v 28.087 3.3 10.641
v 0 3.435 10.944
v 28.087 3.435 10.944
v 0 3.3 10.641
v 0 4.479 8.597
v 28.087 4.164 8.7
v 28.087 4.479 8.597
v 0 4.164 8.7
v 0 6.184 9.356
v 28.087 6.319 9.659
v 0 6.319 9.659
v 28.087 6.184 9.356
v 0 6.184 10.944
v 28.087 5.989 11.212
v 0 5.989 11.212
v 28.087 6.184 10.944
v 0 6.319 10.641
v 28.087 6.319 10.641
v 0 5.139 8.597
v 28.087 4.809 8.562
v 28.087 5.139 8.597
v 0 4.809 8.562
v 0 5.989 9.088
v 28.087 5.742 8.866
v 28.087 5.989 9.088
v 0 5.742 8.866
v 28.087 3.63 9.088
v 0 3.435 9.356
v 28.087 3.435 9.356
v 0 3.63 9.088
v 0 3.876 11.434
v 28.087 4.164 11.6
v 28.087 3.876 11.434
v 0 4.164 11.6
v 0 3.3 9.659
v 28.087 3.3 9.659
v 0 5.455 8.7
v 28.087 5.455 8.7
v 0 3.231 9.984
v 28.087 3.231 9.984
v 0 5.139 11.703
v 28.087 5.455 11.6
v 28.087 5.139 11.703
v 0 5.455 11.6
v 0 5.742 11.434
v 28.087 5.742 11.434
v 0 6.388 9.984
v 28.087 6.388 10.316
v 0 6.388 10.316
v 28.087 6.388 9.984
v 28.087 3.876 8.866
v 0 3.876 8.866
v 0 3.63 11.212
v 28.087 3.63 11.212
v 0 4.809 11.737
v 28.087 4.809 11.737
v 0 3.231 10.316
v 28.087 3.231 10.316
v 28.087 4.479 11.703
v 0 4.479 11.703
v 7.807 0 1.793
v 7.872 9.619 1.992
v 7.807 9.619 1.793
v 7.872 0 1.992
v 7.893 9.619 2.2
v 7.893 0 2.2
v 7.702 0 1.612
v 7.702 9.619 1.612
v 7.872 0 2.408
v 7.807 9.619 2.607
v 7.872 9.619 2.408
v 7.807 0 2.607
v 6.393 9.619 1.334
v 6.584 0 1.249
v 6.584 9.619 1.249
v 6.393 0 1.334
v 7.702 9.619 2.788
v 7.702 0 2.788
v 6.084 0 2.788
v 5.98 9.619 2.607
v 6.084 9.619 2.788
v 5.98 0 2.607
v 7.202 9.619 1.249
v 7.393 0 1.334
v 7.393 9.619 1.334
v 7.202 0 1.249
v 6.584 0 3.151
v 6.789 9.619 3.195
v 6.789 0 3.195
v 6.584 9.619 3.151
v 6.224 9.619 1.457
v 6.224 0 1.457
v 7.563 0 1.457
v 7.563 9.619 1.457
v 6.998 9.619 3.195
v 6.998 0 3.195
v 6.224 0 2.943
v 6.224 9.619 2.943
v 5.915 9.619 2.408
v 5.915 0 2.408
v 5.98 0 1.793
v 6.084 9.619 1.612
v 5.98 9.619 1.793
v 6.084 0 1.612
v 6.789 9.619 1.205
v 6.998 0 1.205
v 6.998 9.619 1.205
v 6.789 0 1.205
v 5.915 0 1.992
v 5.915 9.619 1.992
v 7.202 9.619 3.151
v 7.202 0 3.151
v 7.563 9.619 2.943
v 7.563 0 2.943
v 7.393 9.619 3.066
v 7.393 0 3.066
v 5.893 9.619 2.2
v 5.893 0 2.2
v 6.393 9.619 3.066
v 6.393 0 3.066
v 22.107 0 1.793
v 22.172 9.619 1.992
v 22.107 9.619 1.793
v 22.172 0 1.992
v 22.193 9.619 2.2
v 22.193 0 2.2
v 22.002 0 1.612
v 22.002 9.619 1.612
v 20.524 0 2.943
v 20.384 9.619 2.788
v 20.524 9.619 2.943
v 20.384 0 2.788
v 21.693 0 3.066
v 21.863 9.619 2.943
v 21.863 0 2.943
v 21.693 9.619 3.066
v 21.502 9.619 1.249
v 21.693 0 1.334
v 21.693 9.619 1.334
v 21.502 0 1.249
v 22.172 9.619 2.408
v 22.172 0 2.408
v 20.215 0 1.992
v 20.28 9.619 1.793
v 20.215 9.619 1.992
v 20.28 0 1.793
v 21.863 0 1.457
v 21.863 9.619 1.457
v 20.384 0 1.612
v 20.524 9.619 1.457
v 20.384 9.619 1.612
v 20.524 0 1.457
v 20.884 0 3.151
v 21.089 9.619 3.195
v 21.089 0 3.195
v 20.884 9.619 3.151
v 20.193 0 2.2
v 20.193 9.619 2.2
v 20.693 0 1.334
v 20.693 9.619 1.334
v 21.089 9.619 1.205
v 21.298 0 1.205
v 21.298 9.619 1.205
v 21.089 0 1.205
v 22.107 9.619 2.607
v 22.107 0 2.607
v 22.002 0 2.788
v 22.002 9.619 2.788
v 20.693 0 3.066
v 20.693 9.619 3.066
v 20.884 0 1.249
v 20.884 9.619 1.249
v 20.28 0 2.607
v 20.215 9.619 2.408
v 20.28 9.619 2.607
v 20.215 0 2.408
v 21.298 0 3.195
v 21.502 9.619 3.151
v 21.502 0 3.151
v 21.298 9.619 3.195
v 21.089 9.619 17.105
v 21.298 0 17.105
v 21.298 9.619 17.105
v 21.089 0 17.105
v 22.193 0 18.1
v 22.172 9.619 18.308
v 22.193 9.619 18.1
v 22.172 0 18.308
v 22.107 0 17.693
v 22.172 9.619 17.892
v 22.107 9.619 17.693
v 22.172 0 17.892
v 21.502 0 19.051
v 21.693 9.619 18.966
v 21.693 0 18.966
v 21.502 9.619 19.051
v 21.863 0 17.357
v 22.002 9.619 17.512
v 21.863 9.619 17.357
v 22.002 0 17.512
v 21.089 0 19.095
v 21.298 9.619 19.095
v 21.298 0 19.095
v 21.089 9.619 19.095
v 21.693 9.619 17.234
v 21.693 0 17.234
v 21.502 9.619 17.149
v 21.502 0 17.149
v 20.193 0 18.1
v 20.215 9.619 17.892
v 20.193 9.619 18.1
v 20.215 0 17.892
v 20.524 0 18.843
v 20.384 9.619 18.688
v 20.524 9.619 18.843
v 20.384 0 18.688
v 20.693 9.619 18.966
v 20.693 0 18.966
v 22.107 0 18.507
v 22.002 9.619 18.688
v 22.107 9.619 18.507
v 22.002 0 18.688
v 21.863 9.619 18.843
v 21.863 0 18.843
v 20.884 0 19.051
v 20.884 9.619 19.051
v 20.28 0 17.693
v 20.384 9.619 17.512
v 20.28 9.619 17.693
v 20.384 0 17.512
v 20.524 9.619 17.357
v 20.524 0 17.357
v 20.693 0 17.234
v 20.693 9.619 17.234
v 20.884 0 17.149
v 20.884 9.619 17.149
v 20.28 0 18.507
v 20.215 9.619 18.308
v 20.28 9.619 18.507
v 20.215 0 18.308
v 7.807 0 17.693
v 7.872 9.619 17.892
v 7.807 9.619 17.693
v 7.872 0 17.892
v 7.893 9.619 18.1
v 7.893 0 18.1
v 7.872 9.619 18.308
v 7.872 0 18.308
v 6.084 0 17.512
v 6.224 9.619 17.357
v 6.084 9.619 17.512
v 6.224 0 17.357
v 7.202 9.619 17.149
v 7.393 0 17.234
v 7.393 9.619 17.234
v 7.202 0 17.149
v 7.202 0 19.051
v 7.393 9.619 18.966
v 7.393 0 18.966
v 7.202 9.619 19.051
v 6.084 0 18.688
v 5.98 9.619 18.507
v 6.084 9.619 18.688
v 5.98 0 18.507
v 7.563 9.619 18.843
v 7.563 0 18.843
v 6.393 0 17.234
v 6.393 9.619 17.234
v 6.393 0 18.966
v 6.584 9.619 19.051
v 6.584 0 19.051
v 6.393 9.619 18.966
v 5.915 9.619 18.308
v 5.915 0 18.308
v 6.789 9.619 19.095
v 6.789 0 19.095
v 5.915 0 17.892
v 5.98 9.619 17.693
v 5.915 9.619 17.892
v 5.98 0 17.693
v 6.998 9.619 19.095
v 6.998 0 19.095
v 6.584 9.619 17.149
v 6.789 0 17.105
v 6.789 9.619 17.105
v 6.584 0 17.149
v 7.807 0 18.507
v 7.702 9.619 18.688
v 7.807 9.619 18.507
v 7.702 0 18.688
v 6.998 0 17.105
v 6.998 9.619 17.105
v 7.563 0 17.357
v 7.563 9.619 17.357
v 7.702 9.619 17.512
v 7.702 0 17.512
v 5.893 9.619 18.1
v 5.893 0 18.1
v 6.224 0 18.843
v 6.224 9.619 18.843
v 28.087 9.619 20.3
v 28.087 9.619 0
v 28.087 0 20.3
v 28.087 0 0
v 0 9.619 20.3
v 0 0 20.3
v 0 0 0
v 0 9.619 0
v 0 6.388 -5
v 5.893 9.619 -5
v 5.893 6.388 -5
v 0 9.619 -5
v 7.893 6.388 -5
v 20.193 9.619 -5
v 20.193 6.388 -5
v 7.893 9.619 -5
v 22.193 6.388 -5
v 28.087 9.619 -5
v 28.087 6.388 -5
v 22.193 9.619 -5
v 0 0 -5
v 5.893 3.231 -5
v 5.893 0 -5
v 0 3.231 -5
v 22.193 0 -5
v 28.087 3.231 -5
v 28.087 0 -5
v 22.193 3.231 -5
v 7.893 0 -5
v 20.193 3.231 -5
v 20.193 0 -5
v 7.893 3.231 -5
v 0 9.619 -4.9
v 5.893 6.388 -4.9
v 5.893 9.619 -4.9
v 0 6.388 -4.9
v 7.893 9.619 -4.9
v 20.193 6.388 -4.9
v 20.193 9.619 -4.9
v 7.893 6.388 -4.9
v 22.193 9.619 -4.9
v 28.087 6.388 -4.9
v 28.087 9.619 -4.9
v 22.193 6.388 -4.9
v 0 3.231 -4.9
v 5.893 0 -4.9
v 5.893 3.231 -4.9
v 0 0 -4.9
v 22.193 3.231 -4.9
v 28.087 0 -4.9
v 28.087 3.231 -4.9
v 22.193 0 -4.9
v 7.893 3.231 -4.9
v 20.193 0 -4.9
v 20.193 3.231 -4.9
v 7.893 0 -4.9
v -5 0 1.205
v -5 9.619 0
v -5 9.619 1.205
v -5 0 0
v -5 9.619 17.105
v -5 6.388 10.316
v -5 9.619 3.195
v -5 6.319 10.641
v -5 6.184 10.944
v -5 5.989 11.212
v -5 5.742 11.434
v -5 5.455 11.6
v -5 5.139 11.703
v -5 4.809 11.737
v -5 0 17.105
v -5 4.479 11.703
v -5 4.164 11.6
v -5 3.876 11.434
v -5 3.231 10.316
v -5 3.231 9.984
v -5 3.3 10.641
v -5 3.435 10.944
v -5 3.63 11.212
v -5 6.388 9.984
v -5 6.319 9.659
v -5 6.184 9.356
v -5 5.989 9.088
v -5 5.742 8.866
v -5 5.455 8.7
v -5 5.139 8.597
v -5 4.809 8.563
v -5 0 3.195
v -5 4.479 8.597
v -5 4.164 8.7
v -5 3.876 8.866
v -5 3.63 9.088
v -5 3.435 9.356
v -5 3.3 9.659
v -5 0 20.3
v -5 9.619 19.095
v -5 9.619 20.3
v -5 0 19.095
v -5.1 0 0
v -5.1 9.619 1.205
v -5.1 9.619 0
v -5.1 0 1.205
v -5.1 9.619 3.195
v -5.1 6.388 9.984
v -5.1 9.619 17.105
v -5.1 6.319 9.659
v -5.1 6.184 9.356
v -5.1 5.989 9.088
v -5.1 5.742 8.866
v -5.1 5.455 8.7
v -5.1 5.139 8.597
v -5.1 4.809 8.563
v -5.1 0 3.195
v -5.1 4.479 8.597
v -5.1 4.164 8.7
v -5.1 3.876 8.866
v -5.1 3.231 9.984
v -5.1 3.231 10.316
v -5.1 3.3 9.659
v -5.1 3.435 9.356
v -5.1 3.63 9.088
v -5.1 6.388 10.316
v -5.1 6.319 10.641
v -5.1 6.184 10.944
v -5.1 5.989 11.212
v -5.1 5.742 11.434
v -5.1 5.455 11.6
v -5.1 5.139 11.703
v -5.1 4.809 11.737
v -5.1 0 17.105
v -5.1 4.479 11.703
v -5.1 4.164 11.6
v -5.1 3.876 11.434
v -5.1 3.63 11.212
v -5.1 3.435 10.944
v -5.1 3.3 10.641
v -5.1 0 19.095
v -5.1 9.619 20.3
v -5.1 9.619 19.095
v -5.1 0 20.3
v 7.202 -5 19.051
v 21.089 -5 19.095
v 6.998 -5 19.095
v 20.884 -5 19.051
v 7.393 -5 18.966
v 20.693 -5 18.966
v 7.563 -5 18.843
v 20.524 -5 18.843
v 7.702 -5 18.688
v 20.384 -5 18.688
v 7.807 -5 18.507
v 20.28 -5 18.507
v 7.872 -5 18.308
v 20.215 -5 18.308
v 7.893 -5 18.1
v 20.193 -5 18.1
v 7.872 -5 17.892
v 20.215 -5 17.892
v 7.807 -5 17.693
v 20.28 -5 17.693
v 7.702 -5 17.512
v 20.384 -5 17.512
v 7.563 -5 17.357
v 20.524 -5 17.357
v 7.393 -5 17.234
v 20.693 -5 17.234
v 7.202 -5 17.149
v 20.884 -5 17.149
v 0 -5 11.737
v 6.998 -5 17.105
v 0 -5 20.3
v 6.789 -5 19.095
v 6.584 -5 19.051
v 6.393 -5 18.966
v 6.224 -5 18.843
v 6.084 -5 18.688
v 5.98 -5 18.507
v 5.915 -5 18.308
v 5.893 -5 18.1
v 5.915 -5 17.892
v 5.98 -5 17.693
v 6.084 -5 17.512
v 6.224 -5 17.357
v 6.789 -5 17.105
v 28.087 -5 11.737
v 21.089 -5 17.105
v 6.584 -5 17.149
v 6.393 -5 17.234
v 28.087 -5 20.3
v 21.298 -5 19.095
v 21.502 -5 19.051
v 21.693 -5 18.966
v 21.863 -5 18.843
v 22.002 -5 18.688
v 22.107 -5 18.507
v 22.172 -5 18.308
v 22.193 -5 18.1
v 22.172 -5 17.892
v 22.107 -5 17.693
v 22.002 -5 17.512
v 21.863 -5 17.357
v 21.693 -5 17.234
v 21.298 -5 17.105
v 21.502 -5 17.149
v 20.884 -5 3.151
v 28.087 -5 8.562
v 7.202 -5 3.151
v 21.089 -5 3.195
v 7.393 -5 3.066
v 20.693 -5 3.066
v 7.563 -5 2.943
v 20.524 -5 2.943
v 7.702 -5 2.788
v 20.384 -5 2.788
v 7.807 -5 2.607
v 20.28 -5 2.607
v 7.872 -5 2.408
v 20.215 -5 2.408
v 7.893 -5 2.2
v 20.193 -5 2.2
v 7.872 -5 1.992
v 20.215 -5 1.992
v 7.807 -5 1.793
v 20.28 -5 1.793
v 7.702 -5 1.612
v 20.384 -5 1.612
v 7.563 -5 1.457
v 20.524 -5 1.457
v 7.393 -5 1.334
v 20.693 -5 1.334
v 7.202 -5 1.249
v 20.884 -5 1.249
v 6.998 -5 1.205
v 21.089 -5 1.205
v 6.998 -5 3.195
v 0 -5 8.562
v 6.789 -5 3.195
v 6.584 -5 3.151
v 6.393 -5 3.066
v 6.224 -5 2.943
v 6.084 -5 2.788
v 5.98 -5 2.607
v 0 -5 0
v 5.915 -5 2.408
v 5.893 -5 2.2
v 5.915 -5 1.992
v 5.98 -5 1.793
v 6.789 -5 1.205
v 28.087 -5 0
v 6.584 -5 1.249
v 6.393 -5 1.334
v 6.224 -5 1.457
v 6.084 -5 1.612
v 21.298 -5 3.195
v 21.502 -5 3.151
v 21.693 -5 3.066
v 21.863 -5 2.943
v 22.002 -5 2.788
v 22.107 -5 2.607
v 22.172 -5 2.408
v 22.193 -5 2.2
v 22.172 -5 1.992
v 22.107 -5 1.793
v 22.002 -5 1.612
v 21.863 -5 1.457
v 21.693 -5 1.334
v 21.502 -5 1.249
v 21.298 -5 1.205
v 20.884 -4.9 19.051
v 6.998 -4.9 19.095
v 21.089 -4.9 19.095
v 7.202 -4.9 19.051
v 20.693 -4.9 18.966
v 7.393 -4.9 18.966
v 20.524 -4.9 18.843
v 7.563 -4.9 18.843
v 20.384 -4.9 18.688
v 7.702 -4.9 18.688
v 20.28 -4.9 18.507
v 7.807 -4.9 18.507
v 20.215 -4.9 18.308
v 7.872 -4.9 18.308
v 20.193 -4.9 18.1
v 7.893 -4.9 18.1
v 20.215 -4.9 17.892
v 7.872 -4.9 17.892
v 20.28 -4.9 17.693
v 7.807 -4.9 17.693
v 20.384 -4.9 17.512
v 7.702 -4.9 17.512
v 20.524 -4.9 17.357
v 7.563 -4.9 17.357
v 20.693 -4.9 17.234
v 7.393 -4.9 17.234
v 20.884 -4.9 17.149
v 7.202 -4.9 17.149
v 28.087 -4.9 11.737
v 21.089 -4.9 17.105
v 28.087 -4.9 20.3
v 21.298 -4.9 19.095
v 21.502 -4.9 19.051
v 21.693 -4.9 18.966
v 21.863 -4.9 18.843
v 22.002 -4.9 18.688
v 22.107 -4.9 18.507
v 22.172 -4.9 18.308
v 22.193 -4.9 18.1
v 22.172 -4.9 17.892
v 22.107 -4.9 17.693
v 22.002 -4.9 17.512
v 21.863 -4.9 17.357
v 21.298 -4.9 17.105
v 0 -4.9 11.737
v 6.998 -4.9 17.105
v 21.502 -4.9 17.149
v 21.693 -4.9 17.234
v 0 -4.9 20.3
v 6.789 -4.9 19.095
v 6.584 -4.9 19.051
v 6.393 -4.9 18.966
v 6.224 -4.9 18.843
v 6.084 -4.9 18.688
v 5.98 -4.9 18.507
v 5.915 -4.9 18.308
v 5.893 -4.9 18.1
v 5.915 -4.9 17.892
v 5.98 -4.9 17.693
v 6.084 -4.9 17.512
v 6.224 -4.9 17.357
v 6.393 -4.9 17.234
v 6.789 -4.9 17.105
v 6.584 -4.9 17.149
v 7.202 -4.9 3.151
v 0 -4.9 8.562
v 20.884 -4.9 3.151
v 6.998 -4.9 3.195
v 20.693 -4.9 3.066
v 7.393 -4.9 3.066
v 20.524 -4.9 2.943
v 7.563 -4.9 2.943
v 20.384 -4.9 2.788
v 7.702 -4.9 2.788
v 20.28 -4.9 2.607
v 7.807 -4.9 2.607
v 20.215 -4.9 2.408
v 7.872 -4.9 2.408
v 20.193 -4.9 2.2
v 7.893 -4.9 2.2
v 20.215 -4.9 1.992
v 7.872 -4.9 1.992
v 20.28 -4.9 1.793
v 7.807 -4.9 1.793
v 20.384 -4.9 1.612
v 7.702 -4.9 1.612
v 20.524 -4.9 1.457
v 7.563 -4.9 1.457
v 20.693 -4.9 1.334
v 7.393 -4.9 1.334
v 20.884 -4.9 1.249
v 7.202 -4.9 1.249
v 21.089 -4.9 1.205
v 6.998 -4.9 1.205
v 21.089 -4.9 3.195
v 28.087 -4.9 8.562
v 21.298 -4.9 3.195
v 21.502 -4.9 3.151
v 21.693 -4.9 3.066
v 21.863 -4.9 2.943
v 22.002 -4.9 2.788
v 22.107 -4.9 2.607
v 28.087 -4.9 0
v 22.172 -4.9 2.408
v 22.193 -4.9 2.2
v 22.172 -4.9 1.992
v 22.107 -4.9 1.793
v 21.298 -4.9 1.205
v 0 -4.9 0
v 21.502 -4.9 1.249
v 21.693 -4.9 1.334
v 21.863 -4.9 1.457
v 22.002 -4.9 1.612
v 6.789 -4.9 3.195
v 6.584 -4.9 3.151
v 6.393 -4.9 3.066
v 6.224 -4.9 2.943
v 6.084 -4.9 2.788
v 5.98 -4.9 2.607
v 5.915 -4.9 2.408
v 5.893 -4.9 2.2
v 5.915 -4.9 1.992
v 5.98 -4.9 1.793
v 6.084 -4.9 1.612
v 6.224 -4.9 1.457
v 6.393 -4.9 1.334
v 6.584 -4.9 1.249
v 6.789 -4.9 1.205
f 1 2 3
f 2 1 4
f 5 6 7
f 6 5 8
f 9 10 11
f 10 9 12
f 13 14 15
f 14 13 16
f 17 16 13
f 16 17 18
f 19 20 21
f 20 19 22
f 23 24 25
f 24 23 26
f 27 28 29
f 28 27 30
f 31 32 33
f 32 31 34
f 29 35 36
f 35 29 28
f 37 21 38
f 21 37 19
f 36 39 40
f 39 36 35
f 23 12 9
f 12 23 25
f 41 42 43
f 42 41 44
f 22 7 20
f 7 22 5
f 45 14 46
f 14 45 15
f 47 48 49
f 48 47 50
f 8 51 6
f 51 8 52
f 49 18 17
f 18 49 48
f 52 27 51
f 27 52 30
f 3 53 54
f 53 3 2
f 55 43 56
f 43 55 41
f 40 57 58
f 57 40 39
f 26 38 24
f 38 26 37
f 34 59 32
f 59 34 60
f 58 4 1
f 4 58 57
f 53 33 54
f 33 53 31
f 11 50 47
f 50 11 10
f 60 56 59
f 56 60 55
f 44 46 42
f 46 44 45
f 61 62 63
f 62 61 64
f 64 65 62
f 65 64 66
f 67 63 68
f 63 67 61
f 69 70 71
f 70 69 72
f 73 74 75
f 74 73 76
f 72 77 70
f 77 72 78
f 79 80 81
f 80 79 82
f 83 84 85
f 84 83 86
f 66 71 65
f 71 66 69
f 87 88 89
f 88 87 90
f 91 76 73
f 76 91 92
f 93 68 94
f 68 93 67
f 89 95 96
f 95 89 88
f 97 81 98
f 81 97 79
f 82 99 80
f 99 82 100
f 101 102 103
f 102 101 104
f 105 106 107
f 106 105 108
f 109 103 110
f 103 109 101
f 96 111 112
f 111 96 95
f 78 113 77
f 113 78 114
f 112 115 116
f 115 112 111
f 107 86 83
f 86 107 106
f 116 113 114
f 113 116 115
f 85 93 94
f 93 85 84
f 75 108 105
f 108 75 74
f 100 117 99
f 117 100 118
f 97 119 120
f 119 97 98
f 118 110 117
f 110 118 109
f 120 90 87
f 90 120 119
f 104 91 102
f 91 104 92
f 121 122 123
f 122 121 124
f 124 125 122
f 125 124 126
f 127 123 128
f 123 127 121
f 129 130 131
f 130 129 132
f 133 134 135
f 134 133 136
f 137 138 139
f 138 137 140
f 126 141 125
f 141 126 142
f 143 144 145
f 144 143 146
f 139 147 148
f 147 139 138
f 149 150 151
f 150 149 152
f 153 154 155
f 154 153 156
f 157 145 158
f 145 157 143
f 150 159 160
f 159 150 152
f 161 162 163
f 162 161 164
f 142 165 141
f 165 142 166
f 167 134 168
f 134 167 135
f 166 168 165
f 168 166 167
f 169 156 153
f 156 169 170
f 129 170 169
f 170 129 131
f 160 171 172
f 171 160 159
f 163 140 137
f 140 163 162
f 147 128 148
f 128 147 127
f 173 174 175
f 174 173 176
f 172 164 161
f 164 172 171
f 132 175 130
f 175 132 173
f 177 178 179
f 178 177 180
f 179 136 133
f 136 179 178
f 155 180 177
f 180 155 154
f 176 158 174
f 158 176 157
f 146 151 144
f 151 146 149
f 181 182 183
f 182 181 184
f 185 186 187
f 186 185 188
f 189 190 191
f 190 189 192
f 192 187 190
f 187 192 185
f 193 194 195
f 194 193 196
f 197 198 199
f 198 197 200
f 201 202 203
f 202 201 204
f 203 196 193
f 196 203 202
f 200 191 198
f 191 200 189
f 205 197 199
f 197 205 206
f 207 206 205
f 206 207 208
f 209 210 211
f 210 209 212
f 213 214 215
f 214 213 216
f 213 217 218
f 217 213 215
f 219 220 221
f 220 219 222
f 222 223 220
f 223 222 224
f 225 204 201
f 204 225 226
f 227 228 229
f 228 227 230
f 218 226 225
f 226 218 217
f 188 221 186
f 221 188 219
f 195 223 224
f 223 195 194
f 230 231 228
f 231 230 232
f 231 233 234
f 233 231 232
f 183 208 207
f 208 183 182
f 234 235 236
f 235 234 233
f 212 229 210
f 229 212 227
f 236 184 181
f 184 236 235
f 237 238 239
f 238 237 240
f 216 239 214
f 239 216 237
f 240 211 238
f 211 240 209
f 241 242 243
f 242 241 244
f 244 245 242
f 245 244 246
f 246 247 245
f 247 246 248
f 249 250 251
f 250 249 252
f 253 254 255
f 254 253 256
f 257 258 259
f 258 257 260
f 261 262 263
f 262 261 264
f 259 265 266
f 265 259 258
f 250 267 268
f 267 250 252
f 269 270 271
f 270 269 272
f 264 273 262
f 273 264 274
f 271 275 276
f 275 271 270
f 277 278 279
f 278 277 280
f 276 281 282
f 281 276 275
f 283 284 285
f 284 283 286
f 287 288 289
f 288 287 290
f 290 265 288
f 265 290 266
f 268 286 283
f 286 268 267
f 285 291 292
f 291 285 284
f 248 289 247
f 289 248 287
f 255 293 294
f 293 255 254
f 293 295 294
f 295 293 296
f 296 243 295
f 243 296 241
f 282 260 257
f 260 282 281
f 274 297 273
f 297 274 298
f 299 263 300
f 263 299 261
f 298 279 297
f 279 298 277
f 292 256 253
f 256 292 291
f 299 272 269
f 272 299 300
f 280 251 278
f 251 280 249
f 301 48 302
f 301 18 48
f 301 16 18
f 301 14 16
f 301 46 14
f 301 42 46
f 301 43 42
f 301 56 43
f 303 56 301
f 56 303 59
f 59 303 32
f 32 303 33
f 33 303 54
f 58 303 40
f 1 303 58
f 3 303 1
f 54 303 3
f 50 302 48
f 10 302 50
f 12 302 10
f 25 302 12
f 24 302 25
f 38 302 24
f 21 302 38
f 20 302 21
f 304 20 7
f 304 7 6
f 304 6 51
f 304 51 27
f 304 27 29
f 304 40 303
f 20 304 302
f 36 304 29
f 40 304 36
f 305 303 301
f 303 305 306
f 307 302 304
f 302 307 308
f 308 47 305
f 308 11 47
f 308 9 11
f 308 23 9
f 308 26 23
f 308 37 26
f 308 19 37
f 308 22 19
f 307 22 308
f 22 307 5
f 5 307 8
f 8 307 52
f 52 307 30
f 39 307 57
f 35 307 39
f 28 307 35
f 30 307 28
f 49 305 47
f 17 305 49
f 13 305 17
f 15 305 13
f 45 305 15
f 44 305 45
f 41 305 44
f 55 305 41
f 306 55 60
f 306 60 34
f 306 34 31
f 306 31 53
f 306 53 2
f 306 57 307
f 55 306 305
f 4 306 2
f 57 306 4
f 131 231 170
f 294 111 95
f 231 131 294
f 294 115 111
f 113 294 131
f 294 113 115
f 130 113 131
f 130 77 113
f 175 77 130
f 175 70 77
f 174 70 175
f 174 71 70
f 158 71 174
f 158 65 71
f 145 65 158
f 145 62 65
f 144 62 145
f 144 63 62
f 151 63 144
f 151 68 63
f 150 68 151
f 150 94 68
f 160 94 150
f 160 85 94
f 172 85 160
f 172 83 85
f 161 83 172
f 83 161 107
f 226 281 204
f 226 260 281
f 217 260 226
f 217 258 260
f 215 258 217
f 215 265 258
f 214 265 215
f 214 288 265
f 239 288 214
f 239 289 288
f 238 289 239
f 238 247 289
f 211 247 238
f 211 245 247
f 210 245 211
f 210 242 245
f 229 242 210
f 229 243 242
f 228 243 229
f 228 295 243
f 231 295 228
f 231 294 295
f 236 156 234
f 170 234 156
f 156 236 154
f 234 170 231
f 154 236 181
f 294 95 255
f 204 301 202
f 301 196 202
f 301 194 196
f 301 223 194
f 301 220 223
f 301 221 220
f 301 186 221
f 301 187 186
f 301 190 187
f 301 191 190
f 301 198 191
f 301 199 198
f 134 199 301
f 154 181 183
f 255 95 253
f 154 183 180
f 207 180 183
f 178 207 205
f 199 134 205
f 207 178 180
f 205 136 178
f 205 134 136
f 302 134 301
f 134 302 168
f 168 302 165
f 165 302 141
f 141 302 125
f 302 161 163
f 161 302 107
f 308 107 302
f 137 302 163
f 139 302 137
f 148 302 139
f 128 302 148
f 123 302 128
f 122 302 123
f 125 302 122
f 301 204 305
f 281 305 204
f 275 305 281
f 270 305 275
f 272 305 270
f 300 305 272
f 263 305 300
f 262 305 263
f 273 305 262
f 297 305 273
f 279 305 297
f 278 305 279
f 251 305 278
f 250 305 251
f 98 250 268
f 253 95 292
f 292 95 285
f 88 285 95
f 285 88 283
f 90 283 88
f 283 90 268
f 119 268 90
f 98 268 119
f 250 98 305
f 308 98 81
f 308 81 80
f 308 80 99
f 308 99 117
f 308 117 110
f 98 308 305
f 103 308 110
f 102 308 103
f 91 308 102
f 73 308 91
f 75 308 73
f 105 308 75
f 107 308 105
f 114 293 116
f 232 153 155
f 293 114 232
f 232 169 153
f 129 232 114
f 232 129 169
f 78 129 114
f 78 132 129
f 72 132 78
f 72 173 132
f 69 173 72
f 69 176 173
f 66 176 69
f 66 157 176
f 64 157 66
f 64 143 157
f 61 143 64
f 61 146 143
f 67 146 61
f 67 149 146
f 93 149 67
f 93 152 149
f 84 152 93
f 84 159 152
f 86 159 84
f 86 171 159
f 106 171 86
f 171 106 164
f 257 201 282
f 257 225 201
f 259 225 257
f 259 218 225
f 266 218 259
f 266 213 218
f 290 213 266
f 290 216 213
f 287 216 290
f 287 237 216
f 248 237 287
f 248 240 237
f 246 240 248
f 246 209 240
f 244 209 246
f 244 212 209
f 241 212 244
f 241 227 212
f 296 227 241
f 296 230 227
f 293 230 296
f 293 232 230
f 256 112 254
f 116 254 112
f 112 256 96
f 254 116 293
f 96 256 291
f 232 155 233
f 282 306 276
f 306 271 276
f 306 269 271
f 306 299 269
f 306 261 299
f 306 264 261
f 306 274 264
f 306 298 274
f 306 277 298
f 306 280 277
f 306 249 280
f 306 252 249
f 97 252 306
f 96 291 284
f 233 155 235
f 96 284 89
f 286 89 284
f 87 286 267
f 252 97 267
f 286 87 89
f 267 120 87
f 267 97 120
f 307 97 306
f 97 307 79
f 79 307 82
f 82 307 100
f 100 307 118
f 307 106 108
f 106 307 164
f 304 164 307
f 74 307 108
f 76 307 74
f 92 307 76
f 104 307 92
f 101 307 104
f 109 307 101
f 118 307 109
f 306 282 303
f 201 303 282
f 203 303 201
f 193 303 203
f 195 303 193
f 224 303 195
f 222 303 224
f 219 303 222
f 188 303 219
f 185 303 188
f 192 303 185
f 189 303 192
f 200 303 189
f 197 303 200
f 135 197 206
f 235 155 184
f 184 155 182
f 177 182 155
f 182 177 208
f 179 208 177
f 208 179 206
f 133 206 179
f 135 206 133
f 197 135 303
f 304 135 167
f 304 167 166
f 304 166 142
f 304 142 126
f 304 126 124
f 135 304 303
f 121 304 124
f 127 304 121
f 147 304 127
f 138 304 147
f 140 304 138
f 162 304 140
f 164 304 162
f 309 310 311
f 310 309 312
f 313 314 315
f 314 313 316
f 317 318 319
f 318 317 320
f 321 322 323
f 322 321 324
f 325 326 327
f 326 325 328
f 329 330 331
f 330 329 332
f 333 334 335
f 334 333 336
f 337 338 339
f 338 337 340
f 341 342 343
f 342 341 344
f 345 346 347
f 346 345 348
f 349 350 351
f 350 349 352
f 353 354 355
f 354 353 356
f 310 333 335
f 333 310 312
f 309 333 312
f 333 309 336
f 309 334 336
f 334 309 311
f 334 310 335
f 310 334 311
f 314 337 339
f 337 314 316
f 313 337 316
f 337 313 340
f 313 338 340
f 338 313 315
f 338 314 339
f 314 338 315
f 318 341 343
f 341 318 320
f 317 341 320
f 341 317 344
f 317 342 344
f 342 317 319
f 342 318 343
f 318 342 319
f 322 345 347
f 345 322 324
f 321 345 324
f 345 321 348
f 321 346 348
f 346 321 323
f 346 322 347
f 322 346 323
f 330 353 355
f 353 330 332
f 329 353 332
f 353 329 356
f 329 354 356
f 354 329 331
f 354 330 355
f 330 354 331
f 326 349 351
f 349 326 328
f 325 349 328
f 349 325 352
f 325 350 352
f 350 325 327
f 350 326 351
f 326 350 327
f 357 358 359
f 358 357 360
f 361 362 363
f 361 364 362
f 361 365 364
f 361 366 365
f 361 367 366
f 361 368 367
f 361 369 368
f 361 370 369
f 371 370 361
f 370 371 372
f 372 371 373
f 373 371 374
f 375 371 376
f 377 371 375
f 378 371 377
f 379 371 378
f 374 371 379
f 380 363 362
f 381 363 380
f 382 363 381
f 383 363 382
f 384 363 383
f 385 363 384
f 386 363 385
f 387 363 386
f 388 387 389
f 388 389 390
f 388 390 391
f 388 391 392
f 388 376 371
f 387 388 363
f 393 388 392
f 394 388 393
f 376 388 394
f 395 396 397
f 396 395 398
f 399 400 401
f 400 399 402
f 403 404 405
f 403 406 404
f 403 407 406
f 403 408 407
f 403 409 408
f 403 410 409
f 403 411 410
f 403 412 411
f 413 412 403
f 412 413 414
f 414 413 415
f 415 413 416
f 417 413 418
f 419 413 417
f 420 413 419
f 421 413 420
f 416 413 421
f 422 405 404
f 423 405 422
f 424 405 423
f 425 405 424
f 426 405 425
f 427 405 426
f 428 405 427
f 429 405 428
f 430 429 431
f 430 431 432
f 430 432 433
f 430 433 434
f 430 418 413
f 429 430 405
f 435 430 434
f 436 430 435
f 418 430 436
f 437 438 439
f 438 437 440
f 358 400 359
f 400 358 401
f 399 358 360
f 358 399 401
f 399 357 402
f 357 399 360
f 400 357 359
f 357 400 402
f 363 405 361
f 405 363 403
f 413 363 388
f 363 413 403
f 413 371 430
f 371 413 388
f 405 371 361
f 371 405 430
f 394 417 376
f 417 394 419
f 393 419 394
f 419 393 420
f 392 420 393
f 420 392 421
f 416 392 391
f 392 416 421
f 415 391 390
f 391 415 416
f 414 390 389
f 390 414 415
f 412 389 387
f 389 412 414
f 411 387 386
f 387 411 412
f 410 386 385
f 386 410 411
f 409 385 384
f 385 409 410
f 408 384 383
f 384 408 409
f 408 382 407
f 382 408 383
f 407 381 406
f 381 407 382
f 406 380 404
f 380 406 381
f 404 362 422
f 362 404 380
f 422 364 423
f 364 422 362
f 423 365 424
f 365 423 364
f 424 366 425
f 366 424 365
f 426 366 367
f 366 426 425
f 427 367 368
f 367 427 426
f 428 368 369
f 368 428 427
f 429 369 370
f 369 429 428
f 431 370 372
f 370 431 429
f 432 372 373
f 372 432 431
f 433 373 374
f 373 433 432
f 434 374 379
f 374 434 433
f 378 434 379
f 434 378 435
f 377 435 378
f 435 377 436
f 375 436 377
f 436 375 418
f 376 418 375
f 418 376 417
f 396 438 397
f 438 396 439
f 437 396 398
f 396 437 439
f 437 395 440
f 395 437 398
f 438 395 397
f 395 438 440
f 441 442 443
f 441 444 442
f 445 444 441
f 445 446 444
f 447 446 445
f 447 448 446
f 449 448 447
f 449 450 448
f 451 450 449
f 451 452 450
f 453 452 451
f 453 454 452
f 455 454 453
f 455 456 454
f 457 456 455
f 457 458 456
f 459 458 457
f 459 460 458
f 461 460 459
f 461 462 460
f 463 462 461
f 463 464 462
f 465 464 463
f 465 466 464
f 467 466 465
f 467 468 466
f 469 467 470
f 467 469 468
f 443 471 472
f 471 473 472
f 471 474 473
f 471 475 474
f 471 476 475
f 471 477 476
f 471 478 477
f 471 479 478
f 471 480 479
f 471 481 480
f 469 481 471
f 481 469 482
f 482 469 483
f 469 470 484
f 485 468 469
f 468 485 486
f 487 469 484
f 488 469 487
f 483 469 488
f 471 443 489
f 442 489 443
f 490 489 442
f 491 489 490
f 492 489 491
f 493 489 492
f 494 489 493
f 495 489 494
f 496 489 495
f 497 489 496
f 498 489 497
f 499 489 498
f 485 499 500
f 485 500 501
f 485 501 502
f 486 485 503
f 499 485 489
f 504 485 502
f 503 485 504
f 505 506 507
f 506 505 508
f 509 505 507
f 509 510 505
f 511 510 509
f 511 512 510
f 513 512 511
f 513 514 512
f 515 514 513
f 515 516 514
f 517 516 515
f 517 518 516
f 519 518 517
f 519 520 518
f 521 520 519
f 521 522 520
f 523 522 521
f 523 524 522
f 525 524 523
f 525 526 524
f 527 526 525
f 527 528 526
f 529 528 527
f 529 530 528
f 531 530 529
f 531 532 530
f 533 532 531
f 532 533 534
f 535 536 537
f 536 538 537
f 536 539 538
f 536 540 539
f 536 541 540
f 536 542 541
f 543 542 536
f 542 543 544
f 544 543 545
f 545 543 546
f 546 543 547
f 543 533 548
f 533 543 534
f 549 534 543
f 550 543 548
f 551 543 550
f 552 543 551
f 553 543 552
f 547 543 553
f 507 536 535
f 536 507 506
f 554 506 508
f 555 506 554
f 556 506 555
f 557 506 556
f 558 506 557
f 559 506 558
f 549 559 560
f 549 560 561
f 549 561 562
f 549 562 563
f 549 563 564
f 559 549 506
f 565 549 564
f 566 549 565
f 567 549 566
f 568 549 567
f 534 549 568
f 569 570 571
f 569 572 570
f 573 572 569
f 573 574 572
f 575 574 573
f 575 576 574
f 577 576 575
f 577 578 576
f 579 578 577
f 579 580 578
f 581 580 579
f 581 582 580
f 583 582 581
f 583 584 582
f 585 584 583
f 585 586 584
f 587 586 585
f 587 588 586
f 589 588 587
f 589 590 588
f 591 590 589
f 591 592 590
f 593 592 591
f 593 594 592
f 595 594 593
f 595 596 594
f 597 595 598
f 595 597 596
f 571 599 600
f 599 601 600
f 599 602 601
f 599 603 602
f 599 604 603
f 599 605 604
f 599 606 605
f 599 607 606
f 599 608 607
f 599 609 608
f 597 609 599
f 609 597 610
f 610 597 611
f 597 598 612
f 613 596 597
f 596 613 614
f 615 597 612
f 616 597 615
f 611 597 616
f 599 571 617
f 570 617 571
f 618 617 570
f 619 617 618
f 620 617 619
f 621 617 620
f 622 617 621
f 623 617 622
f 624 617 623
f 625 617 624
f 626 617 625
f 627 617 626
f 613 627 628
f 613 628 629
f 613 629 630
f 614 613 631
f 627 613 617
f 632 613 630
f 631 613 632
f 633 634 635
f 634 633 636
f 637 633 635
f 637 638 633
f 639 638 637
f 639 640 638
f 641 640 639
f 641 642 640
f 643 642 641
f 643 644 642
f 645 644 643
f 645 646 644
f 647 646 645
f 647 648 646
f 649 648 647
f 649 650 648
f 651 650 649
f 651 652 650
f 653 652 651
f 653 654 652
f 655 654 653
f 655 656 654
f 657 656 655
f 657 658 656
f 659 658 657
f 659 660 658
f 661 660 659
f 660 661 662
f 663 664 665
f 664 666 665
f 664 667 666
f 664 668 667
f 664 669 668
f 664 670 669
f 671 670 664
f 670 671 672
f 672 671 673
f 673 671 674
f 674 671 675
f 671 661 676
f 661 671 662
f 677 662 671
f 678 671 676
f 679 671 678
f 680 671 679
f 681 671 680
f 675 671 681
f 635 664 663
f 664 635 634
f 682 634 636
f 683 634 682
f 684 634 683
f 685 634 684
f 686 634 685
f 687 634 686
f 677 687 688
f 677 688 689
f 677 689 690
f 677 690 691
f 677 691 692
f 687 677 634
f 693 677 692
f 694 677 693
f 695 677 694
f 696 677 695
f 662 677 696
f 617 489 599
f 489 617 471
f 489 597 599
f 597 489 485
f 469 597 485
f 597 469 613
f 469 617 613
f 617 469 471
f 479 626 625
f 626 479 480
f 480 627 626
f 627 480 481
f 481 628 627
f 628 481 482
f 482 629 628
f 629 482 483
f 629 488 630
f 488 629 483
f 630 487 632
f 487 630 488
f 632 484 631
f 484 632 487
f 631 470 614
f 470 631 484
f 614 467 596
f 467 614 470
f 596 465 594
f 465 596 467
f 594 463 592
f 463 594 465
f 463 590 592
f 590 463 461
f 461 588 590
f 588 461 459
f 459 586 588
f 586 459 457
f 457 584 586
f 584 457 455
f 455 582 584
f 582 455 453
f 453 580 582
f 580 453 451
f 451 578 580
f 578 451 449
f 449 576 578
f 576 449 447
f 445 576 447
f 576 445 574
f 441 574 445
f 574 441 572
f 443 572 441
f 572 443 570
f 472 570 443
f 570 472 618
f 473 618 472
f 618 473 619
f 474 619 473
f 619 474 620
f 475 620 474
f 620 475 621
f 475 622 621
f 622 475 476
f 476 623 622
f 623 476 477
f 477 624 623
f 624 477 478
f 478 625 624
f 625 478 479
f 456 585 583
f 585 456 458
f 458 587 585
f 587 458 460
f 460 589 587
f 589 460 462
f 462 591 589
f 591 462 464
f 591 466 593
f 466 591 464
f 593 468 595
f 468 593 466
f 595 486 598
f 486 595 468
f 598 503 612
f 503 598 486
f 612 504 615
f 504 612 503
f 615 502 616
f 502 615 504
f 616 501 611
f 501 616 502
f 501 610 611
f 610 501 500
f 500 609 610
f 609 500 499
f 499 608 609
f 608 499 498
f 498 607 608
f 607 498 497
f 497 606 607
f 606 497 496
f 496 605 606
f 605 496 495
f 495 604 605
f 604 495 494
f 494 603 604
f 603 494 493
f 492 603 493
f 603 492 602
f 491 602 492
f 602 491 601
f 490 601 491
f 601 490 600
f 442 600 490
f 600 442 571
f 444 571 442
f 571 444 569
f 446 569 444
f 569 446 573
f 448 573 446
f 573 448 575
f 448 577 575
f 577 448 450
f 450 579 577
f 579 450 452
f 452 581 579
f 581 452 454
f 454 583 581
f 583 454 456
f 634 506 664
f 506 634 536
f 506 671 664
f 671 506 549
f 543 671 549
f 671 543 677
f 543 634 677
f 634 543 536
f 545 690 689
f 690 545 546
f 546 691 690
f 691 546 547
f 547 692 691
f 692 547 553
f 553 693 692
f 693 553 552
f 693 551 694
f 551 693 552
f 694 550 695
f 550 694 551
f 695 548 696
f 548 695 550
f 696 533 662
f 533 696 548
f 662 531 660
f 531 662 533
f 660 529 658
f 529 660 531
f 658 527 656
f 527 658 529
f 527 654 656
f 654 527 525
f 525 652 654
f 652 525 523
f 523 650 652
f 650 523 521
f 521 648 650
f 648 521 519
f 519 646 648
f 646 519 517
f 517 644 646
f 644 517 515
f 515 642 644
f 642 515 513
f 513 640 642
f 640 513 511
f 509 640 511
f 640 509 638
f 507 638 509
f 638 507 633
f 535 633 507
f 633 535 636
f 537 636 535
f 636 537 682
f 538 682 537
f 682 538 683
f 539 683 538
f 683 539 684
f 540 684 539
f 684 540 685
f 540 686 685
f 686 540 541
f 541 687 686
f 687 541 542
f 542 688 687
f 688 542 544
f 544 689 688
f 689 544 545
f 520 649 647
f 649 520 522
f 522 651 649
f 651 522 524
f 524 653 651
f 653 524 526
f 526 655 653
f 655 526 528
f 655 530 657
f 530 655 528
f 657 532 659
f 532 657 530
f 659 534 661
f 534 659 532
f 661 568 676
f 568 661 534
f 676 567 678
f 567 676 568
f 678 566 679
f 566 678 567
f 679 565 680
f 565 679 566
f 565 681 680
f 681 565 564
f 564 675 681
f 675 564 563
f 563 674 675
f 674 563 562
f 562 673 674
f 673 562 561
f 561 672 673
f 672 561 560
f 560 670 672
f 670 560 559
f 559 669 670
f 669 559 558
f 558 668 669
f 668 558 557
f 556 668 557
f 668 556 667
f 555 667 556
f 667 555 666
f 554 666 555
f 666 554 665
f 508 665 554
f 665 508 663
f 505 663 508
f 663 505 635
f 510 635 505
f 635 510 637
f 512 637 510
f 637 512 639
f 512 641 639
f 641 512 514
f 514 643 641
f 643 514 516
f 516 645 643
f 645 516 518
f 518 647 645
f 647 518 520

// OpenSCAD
// Heater Cartridge Block for MK5 Extruder upgrade

// render_part=1; // Heater_Cartridge_Block()
// render_part=2; // X plane intersected slices
//render_part=3; // Y plane intersected slices
// render_part=4; // Z plane intersected slices
// render_part=5; // All 2D intersected slices
 render_part=6; // 3D Model with 2D intersected slices

function Heater_Block_X() = 28.0869;
function Heater_Block_Y() = 19.2374;
function Heater_Block_Z() = 20.3;
function Heater_Block_Resistor_Mount_DX() = 14.3;
function Heater_Block_Resistor_Mount_DZ() = 15.9;
function Heater_Block_Resistor_Bolt_D() = 2.0;
function Heater_Cartridge_D() = 25.4*1/8;

module Heater_Cartridge_Block_Body(extension=0.1
	, HCBB_X=Heater_Block_X()
	, HCBB_Y=Heater_Block_Y()/2
	, HCBB_Z=Heater_Block_Z()
	) {
  cube(size=[HCBB_X,HCBB_Y,HCBB_Z],center=false);
}

module Heater_Cartridge_Block_Holes(extension=0.1
	, HCBH_X=Heater_Block_X()
	, HCBH_Y=Heater_Block_Y()/2
	, HCBH_Z=Heater_Block_Z()
	, HCBH_Resistor_Mount_DX=Heater_Block_Resistor_Mount_DX()
	, HCBH_Resistor_Mount_DZ=Heater_Block_Resistor_Mount_DZ()
	, HCBH_Resistor_Mount_Hole_D=Heater_Block_Resistor_Bolt_D()
	, HCBH_Cartridge_Hole_D=Heater_Cartridge_D()
	) {
  translate([-extension,HCBH_Y/2,HCBH_Z/2])
	rotate([0,90,0]) cylinder($fs=0.1,r=HCBH_Cartridge_Hole_D/2,h=HCBH_X+2*extension,center=false);
  translate([HCBH_X/2-HCBH_Resistor_Mount_DX/2,-extension,HCBH_Z/2-HCBH_Resistor_Mount_DZ/2])
	rotate([-90,0,0]) cylinder($fs=0.1,r=HCBH_Resistor_Mount_Hole_D/2,h=HCBH_Y+2*extension,center=false);
  translate([HCBH_X/2+HCBH_Resistor_Mount_DX/2,-extension,HCBH_Z/2-HCBH_Resistor_Mount_DZ/2])
	rotate([-90,0,0]) cylinder($fs=0.1,r=HCBH_Resistor_Mount_Hole_D/2,h=HCBH_Y+2*extension,center=false);
  translate([HCBH_X/2+HCBH_Resistor_Mount_DX/2,-extension,HCBH_Z/2+HCBH_Resistor_Mount_DZ/2])
	rotate([-90,0,0]) cylinder($fs=0.1,r=HCBH_Resistor_Mount_Hole_D/2,h=HCBH_Y+2*extension,center=false);
  translate([HCBH_X/2-HCBH_Resistor_Mount_DX/2,-extension,HCBH_Z/2+HCBH_Resistor_Mount_DZ/2])
	rotate([-90,0,0]) cylinder($fs=0.1,r=HCBH_Resistor_Mount_Hole_D/2,h=HCBH_Y+2*extension,center=false);
}

module Heater_Cartridge_Block(extension=0.1
	) {
  difference() {
    Heater_Cartridge_Block_Body(extension=extension);
    Heater_Cartridge_Block_Holes(extension=extension);
  }
}

if(render_part==1) {
  echo("Rendering Heater_Cartridge_Block()...");
  Heater_Cartridge_Block();
}

if(render_part==2) {
  echo("Rendering X plane instersected slices");
  intersection() {
    projection(cut=true) translate([0,-Heater_Block_Y()/4,-Heater_Block_Z()/2])
	Heater_Cartridge_Block();
    projection(cut=true) translate([0,-Heater_Block_Y()/4,-Heater_Block_Z()/2+Heater_Block_Resistor_Mount_DZ()/2])
	Heater_Cartridge_Block();
  }
}

if(render_part==3) {
  echo("Rendering Y plane instersected slices");
  intersection() {
    projection(cut=true) rotate([0,90,0]) translate([-Heater_Block_X()/2,0,-Heater_Block_Z()/2])
	Heater_Cartridge_Block();
    projection(cut=true) rotate([0,90,0]) translate([-Heater_Block_X()/2+Heater_Block_Resistor_Mount_DX()/2,0,-Heater_Block_Z()/2])
	Heater_Cartridge_Block();
  }
}

if(render_part==4) {
  echo("Rendering Z plane instersected slices");
    projection(cut=true) rotate([90,0,0]) translate([-Heater_Block_X()/2,-Heater_Block_Y()/4,0])
	Heater_Cartridge_Block();
}

if(render_part==5) {
  echo("Rendering all 2D intersected slices");
  // Heater_Cartridge_Block();

  translate([5.0,Heater_Block_Y()/4+5.0,0])   intersection() {
    projection(cut=true) translate([0,-Heater_Block_Y()/4,-Heater_Block_Z()/2])
	Heater_Cartridge_Block();
    projection(cut=true) translate([0,-Heater_Block_Y()/4,-Heater_Block_Z()/2+Heater_Block_Resistor_Mount_DZ()/2])
	Heater_Cartridge_Block();
  }

  translate([-5.0,-Heater_Block_Z()/2-5.0,0]) rotate(90) intersection() {
    projection(cut=true) rotate([0,90,0]) translate([-Heater_Block_X()/2,0,-Heater_Block_Z()/2])
	Heater_Cartridge_Block();
    projection(cut=true) rotate([0,90,0]) translate([-Heater_Block_X()/2+Heater_Block_Resistor_Mount_DX()/2,0,-Heater_Block_Z()/2])
	Heater_Cartridge_Block();
  }

  translate([5.0+Heater_Block_X()/2,-5.0,0])  
    projection(cut=true) rotate([90,0,0]) translate([-Heater_Block_X()/2,-Heater_Block_Y()/4,0])
	Heater_Cartridge_Block();

}


if(render_part==6) {
  echo("Rendering 3D Model with Intersected Slices");
  Heater_Cartridge_Block();

  translate([0,Heater_Block_Y()/4,-5.0])   linear_extrude(height=0.1) intersection() {
    projection(cut=true) translate([0,-Heater_Block_Y()/4,-Heater_Block_Z()/2])
	Heater_Cartridge_Block();
    projection(cut=true) translate([0,-Heater_Block_Y()/4,-Heater_Block_Z()/2+Heater_Block_Resistor_Mount_DZ()/2])
	Heater_Cartridge_Block();
  }

  translate([-5.0,0,Heater_Block_Z()/2]) rotate([0,-90,0]) linear_extrude(height=0.1) intersection() {
    projection(cut=true) rotate([0,90,0]) translate([-Heater_Block_X()/2,0,-Heater_Block_Z()/2])
	Heater_Cartridge_Block();
    projection(cut=true) rotate([0,90,0]) translate([-Heater_Block_X()/2+Heater_Block_Resistor_Mount_DX()/2,0,-Heater_Block_Z()/2])
	Heater_Cartridge_Block();
  }

  translate([Heater_Block_X()/2,-5.0,0]) rotate([-90,0,0]) linear_extrude(height=0.1) 
    projection(cut=true) rotate([90,0,0]) translate([-Heater_Block_X()/2,-Heater_Block_Y()/4,0])
	Heater_Cartridge_Block();

}
